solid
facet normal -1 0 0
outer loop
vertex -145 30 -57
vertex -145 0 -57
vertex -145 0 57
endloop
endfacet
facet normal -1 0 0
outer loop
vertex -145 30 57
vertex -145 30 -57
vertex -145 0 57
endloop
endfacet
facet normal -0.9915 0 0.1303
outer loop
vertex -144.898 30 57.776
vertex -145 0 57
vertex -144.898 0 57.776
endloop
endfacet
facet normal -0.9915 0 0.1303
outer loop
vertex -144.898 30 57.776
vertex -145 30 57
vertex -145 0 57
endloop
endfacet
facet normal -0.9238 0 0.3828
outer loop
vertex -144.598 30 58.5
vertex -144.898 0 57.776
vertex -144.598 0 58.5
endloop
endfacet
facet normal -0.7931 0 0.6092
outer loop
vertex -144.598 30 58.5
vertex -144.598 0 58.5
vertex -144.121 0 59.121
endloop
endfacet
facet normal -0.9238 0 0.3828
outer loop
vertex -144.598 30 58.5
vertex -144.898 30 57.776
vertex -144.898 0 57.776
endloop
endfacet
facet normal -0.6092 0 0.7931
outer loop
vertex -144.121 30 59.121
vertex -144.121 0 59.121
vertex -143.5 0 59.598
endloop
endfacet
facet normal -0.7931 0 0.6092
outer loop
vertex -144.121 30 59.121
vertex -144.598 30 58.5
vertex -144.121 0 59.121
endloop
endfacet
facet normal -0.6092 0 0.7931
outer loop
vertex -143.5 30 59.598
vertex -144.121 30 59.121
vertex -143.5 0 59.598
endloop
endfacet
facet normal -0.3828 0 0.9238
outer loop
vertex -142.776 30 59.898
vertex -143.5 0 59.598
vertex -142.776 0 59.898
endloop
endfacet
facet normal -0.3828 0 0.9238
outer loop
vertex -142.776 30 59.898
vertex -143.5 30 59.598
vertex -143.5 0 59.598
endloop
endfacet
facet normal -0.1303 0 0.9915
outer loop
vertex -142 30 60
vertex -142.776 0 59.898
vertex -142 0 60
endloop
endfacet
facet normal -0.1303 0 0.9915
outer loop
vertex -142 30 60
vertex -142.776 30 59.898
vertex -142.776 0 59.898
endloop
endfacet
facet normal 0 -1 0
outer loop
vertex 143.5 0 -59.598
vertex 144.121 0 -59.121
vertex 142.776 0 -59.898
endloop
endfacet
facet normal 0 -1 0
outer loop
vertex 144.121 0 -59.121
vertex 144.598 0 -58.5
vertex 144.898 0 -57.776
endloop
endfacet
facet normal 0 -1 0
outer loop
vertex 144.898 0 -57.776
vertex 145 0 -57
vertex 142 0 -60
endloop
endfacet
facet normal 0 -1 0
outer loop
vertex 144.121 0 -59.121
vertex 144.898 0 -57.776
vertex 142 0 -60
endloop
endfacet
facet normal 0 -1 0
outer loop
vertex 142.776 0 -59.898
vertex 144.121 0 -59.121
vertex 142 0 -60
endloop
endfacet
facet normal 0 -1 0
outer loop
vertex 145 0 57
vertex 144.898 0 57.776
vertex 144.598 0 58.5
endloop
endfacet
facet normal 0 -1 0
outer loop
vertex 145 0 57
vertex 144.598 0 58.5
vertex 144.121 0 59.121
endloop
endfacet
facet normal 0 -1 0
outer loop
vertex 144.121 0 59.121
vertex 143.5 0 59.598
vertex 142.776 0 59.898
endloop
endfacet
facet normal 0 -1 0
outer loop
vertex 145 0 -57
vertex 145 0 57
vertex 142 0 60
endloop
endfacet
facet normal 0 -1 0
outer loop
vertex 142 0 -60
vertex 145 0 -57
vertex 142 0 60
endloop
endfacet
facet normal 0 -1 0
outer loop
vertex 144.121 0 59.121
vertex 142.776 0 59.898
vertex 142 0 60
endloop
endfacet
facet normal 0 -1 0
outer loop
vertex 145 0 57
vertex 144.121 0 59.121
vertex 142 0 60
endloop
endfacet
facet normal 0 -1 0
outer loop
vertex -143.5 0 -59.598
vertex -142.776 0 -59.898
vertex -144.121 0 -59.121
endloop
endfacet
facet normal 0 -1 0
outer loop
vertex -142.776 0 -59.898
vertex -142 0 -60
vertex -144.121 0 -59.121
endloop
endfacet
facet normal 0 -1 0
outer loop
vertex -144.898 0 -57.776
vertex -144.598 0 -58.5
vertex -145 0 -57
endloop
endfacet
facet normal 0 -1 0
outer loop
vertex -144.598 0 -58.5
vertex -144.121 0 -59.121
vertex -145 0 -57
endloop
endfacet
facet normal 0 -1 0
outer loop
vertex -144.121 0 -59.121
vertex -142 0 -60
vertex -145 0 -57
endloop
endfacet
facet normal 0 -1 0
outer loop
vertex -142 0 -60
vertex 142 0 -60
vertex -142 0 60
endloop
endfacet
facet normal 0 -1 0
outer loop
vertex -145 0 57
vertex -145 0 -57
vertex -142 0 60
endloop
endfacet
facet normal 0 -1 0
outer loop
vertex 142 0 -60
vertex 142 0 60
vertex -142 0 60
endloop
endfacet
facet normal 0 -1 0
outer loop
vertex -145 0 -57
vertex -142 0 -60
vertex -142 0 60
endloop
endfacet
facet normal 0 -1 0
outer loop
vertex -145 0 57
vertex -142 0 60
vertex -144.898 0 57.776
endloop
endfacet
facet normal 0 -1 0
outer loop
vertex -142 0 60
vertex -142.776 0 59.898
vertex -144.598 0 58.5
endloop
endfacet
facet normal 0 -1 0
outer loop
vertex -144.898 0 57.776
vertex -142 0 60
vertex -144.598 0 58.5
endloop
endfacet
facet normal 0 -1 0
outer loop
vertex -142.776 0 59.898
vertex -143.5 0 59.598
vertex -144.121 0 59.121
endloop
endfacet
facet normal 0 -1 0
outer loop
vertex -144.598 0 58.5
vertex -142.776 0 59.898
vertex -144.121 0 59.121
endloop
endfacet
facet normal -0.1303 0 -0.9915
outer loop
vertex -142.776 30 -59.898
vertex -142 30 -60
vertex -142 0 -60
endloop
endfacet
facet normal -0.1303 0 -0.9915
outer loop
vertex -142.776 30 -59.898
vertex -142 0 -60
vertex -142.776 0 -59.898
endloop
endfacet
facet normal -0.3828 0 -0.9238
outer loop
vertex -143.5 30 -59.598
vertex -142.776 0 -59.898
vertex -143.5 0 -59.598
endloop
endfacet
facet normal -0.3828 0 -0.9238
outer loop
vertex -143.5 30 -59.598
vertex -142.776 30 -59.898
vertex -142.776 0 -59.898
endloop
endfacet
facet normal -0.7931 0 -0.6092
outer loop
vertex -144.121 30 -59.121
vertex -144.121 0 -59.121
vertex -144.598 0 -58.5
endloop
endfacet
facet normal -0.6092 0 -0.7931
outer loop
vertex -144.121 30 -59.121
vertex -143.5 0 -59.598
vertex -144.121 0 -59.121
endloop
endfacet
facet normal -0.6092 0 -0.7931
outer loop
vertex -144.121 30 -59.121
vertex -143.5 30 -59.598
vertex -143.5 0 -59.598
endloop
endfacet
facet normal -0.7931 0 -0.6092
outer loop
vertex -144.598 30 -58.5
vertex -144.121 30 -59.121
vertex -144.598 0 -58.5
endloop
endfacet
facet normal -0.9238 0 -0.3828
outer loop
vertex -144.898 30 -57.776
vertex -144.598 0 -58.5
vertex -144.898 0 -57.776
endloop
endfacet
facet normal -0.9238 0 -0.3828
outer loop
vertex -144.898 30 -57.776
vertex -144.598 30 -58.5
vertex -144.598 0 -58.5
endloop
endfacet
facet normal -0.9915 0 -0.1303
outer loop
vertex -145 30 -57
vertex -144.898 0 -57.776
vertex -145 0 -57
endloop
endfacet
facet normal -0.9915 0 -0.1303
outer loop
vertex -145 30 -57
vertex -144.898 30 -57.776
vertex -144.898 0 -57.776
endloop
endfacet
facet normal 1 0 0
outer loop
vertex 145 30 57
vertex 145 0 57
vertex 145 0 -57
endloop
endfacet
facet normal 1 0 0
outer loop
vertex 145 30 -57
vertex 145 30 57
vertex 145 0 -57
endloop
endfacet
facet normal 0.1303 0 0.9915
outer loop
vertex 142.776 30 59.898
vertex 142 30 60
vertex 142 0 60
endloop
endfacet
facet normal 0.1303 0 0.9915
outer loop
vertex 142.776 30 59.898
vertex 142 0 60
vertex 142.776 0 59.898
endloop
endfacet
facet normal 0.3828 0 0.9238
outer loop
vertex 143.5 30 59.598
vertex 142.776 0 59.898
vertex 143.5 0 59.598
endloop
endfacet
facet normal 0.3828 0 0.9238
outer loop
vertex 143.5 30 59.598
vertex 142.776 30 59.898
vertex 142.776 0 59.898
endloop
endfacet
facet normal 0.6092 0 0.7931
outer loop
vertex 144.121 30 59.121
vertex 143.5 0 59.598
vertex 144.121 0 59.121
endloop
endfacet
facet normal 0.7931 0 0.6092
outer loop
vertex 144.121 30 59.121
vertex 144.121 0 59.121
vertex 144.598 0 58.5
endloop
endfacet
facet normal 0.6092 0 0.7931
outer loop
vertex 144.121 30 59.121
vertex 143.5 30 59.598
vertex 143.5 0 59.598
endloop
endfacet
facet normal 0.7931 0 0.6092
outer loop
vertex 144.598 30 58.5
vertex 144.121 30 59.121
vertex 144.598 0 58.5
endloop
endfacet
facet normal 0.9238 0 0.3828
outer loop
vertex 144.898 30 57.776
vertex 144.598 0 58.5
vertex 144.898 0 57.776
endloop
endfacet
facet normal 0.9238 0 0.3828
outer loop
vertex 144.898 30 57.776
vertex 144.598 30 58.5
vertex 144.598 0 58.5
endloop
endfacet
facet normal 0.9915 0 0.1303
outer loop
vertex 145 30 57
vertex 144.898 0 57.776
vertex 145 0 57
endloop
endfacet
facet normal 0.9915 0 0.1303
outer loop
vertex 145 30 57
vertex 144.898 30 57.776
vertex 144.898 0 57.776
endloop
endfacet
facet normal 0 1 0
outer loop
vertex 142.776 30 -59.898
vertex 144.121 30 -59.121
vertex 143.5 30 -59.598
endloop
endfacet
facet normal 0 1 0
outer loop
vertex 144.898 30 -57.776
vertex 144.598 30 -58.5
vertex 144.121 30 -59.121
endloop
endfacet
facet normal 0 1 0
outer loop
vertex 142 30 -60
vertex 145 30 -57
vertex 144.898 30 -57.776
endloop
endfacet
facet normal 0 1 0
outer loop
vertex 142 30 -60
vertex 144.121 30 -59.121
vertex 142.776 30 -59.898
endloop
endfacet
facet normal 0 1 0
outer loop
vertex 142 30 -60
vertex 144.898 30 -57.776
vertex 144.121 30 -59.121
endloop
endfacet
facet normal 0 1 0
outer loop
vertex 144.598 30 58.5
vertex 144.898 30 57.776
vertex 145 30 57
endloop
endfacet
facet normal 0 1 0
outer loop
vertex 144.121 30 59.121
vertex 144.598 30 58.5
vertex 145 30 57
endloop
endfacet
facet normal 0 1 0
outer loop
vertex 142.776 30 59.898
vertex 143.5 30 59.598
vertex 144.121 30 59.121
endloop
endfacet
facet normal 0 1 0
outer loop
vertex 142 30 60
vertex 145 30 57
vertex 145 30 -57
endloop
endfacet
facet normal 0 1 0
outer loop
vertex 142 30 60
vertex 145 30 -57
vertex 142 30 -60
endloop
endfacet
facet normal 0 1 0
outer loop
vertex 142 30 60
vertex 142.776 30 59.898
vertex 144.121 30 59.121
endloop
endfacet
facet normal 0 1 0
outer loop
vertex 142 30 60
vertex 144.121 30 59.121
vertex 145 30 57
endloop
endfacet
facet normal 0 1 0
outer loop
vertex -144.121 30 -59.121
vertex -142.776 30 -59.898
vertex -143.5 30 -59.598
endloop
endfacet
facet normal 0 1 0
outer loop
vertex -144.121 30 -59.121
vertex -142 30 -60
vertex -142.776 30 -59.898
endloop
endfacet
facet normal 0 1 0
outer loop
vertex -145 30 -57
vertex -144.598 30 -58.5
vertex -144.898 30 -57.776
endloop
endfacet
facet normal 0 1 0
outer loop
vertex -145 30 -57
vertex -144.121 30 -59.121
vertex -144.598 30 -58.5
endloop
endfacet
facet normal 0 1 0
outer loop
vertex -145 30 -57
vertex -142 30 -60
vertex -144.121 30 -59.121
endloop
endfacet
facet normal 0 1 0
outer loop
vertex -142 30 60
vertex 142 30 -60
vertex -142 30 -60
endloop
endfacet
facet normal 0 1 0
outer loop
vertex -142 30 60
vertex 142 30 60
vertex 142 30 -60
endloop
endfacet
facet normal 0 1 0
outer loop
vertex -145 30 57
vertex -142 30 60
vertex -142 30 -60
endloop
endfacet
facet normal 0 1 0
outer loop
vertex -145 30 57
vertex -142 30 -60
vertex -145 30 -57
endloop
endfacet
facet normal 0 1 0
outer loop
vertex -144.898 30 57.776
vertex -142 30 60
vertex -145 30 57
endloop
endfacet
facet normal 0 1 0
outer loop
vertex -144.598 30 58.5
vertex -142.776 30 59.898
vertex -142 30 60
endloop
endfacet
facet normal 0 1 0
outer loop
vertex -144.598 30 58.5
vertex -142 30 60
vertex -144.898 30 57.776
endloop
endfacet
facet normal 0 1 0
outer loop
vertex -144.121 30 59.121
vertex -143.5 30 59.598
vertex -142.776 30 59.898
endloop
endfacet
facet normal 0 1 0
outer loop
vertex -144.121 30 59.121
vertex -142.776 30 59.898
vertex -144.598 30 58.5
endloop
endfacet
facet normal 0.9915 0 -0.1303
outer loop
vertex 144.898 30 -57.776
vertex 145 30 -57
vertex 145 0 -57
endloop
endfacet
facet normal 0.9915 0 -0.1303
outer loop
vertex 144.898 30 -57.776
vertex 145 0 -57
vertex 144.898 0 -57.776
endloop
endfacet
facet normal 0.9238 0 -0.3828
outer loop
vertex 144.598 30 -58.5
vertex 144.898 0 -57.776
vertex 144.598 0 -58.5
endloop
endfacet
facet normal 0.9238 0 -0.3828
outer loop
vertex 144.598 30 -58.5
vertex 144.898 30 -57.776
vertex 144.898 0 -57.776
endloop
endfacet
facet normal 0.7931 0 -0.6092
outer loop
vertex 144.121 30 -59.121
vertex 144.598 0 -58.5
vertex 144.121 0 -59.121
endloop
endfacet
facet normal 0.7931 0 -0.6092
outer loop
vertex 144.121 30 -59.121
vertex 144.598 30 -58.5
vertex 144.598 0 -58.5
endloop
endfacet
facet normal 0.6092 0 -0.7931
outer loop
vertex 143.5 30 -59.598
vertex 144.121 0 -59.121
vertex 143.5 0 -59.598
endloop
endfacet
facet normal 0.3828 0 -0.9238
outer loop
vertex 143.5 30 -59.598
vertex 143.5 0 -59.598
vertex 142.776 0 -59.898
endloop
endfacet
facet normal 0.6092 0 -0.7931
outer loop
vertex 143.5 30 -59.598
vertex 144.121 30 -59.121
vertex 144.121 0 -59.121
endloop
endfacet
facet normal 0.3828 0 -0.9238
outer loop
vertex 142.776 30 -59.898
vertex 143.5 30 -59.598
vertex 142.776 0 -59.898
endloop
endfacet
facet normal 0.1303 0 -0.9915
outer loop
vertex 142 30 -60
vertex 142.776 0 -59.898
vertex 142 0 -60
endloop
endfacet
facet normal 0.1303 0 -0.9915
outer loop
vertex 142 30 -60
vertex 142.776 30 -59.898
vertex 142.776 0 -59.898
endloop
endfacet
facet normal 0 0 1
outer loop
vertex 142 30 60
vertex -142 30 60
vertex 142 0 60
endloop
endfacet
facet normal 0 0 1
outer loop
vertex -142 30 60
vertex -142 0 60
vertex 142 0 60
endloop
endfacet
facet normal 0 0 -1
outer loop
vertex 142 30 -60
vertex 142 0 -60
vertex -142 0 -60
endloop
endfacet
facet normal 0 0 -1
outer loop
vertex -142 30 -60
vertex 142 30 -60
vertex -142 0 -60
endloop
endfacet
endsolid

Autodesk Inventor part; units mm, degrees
ref_plane "YZ Plane" through (0, 0, 0) normal (1, 0, 0) x (0, 1, 0)
ref_plane "XZ Plane" through (0, 0, 0) normal (0, 1, 0) x (-1, 0, 0)
ref_plane "XY Plane" through (0, 0, 0) normal (0, 0, 1) x (1, 0, 0)
sketch "Sketch1" plane through (0, 0, 0) normal (0, 1, 0) x (-1, 0, 0)
  line L0 (145, 60) -> (-145, 60)
  line L1 (-145, 60) -> (-145, -60)
  line L2 (-145, -60) -> (145, -60)
  line L3 (145, -60) -> (145, 60)
  line L4 (145, 60) -> (-145, -60) construction
  line L5 (-145, 60) -> (145, -60) construction
  point P0 (0, 0)
  dimension "d0" = 290
  dimension "d1" = 120
extrude "Extrusion1" add sketch "Sketch1" along normal blind 30
fillet "Face Fillet1" radius 3 1 edges at (-145, 15, -60)
fillet "Face Fillet2" radius 3 1 edges at (-145, 15, 60)
fillet "Face Fillet3" radius 3 1 edges at (145, 15, 60)
fillet "Face Fillet4" radius 3 1 edges at (145, 15, -60)
properties part number "base_of_linear_drive"
